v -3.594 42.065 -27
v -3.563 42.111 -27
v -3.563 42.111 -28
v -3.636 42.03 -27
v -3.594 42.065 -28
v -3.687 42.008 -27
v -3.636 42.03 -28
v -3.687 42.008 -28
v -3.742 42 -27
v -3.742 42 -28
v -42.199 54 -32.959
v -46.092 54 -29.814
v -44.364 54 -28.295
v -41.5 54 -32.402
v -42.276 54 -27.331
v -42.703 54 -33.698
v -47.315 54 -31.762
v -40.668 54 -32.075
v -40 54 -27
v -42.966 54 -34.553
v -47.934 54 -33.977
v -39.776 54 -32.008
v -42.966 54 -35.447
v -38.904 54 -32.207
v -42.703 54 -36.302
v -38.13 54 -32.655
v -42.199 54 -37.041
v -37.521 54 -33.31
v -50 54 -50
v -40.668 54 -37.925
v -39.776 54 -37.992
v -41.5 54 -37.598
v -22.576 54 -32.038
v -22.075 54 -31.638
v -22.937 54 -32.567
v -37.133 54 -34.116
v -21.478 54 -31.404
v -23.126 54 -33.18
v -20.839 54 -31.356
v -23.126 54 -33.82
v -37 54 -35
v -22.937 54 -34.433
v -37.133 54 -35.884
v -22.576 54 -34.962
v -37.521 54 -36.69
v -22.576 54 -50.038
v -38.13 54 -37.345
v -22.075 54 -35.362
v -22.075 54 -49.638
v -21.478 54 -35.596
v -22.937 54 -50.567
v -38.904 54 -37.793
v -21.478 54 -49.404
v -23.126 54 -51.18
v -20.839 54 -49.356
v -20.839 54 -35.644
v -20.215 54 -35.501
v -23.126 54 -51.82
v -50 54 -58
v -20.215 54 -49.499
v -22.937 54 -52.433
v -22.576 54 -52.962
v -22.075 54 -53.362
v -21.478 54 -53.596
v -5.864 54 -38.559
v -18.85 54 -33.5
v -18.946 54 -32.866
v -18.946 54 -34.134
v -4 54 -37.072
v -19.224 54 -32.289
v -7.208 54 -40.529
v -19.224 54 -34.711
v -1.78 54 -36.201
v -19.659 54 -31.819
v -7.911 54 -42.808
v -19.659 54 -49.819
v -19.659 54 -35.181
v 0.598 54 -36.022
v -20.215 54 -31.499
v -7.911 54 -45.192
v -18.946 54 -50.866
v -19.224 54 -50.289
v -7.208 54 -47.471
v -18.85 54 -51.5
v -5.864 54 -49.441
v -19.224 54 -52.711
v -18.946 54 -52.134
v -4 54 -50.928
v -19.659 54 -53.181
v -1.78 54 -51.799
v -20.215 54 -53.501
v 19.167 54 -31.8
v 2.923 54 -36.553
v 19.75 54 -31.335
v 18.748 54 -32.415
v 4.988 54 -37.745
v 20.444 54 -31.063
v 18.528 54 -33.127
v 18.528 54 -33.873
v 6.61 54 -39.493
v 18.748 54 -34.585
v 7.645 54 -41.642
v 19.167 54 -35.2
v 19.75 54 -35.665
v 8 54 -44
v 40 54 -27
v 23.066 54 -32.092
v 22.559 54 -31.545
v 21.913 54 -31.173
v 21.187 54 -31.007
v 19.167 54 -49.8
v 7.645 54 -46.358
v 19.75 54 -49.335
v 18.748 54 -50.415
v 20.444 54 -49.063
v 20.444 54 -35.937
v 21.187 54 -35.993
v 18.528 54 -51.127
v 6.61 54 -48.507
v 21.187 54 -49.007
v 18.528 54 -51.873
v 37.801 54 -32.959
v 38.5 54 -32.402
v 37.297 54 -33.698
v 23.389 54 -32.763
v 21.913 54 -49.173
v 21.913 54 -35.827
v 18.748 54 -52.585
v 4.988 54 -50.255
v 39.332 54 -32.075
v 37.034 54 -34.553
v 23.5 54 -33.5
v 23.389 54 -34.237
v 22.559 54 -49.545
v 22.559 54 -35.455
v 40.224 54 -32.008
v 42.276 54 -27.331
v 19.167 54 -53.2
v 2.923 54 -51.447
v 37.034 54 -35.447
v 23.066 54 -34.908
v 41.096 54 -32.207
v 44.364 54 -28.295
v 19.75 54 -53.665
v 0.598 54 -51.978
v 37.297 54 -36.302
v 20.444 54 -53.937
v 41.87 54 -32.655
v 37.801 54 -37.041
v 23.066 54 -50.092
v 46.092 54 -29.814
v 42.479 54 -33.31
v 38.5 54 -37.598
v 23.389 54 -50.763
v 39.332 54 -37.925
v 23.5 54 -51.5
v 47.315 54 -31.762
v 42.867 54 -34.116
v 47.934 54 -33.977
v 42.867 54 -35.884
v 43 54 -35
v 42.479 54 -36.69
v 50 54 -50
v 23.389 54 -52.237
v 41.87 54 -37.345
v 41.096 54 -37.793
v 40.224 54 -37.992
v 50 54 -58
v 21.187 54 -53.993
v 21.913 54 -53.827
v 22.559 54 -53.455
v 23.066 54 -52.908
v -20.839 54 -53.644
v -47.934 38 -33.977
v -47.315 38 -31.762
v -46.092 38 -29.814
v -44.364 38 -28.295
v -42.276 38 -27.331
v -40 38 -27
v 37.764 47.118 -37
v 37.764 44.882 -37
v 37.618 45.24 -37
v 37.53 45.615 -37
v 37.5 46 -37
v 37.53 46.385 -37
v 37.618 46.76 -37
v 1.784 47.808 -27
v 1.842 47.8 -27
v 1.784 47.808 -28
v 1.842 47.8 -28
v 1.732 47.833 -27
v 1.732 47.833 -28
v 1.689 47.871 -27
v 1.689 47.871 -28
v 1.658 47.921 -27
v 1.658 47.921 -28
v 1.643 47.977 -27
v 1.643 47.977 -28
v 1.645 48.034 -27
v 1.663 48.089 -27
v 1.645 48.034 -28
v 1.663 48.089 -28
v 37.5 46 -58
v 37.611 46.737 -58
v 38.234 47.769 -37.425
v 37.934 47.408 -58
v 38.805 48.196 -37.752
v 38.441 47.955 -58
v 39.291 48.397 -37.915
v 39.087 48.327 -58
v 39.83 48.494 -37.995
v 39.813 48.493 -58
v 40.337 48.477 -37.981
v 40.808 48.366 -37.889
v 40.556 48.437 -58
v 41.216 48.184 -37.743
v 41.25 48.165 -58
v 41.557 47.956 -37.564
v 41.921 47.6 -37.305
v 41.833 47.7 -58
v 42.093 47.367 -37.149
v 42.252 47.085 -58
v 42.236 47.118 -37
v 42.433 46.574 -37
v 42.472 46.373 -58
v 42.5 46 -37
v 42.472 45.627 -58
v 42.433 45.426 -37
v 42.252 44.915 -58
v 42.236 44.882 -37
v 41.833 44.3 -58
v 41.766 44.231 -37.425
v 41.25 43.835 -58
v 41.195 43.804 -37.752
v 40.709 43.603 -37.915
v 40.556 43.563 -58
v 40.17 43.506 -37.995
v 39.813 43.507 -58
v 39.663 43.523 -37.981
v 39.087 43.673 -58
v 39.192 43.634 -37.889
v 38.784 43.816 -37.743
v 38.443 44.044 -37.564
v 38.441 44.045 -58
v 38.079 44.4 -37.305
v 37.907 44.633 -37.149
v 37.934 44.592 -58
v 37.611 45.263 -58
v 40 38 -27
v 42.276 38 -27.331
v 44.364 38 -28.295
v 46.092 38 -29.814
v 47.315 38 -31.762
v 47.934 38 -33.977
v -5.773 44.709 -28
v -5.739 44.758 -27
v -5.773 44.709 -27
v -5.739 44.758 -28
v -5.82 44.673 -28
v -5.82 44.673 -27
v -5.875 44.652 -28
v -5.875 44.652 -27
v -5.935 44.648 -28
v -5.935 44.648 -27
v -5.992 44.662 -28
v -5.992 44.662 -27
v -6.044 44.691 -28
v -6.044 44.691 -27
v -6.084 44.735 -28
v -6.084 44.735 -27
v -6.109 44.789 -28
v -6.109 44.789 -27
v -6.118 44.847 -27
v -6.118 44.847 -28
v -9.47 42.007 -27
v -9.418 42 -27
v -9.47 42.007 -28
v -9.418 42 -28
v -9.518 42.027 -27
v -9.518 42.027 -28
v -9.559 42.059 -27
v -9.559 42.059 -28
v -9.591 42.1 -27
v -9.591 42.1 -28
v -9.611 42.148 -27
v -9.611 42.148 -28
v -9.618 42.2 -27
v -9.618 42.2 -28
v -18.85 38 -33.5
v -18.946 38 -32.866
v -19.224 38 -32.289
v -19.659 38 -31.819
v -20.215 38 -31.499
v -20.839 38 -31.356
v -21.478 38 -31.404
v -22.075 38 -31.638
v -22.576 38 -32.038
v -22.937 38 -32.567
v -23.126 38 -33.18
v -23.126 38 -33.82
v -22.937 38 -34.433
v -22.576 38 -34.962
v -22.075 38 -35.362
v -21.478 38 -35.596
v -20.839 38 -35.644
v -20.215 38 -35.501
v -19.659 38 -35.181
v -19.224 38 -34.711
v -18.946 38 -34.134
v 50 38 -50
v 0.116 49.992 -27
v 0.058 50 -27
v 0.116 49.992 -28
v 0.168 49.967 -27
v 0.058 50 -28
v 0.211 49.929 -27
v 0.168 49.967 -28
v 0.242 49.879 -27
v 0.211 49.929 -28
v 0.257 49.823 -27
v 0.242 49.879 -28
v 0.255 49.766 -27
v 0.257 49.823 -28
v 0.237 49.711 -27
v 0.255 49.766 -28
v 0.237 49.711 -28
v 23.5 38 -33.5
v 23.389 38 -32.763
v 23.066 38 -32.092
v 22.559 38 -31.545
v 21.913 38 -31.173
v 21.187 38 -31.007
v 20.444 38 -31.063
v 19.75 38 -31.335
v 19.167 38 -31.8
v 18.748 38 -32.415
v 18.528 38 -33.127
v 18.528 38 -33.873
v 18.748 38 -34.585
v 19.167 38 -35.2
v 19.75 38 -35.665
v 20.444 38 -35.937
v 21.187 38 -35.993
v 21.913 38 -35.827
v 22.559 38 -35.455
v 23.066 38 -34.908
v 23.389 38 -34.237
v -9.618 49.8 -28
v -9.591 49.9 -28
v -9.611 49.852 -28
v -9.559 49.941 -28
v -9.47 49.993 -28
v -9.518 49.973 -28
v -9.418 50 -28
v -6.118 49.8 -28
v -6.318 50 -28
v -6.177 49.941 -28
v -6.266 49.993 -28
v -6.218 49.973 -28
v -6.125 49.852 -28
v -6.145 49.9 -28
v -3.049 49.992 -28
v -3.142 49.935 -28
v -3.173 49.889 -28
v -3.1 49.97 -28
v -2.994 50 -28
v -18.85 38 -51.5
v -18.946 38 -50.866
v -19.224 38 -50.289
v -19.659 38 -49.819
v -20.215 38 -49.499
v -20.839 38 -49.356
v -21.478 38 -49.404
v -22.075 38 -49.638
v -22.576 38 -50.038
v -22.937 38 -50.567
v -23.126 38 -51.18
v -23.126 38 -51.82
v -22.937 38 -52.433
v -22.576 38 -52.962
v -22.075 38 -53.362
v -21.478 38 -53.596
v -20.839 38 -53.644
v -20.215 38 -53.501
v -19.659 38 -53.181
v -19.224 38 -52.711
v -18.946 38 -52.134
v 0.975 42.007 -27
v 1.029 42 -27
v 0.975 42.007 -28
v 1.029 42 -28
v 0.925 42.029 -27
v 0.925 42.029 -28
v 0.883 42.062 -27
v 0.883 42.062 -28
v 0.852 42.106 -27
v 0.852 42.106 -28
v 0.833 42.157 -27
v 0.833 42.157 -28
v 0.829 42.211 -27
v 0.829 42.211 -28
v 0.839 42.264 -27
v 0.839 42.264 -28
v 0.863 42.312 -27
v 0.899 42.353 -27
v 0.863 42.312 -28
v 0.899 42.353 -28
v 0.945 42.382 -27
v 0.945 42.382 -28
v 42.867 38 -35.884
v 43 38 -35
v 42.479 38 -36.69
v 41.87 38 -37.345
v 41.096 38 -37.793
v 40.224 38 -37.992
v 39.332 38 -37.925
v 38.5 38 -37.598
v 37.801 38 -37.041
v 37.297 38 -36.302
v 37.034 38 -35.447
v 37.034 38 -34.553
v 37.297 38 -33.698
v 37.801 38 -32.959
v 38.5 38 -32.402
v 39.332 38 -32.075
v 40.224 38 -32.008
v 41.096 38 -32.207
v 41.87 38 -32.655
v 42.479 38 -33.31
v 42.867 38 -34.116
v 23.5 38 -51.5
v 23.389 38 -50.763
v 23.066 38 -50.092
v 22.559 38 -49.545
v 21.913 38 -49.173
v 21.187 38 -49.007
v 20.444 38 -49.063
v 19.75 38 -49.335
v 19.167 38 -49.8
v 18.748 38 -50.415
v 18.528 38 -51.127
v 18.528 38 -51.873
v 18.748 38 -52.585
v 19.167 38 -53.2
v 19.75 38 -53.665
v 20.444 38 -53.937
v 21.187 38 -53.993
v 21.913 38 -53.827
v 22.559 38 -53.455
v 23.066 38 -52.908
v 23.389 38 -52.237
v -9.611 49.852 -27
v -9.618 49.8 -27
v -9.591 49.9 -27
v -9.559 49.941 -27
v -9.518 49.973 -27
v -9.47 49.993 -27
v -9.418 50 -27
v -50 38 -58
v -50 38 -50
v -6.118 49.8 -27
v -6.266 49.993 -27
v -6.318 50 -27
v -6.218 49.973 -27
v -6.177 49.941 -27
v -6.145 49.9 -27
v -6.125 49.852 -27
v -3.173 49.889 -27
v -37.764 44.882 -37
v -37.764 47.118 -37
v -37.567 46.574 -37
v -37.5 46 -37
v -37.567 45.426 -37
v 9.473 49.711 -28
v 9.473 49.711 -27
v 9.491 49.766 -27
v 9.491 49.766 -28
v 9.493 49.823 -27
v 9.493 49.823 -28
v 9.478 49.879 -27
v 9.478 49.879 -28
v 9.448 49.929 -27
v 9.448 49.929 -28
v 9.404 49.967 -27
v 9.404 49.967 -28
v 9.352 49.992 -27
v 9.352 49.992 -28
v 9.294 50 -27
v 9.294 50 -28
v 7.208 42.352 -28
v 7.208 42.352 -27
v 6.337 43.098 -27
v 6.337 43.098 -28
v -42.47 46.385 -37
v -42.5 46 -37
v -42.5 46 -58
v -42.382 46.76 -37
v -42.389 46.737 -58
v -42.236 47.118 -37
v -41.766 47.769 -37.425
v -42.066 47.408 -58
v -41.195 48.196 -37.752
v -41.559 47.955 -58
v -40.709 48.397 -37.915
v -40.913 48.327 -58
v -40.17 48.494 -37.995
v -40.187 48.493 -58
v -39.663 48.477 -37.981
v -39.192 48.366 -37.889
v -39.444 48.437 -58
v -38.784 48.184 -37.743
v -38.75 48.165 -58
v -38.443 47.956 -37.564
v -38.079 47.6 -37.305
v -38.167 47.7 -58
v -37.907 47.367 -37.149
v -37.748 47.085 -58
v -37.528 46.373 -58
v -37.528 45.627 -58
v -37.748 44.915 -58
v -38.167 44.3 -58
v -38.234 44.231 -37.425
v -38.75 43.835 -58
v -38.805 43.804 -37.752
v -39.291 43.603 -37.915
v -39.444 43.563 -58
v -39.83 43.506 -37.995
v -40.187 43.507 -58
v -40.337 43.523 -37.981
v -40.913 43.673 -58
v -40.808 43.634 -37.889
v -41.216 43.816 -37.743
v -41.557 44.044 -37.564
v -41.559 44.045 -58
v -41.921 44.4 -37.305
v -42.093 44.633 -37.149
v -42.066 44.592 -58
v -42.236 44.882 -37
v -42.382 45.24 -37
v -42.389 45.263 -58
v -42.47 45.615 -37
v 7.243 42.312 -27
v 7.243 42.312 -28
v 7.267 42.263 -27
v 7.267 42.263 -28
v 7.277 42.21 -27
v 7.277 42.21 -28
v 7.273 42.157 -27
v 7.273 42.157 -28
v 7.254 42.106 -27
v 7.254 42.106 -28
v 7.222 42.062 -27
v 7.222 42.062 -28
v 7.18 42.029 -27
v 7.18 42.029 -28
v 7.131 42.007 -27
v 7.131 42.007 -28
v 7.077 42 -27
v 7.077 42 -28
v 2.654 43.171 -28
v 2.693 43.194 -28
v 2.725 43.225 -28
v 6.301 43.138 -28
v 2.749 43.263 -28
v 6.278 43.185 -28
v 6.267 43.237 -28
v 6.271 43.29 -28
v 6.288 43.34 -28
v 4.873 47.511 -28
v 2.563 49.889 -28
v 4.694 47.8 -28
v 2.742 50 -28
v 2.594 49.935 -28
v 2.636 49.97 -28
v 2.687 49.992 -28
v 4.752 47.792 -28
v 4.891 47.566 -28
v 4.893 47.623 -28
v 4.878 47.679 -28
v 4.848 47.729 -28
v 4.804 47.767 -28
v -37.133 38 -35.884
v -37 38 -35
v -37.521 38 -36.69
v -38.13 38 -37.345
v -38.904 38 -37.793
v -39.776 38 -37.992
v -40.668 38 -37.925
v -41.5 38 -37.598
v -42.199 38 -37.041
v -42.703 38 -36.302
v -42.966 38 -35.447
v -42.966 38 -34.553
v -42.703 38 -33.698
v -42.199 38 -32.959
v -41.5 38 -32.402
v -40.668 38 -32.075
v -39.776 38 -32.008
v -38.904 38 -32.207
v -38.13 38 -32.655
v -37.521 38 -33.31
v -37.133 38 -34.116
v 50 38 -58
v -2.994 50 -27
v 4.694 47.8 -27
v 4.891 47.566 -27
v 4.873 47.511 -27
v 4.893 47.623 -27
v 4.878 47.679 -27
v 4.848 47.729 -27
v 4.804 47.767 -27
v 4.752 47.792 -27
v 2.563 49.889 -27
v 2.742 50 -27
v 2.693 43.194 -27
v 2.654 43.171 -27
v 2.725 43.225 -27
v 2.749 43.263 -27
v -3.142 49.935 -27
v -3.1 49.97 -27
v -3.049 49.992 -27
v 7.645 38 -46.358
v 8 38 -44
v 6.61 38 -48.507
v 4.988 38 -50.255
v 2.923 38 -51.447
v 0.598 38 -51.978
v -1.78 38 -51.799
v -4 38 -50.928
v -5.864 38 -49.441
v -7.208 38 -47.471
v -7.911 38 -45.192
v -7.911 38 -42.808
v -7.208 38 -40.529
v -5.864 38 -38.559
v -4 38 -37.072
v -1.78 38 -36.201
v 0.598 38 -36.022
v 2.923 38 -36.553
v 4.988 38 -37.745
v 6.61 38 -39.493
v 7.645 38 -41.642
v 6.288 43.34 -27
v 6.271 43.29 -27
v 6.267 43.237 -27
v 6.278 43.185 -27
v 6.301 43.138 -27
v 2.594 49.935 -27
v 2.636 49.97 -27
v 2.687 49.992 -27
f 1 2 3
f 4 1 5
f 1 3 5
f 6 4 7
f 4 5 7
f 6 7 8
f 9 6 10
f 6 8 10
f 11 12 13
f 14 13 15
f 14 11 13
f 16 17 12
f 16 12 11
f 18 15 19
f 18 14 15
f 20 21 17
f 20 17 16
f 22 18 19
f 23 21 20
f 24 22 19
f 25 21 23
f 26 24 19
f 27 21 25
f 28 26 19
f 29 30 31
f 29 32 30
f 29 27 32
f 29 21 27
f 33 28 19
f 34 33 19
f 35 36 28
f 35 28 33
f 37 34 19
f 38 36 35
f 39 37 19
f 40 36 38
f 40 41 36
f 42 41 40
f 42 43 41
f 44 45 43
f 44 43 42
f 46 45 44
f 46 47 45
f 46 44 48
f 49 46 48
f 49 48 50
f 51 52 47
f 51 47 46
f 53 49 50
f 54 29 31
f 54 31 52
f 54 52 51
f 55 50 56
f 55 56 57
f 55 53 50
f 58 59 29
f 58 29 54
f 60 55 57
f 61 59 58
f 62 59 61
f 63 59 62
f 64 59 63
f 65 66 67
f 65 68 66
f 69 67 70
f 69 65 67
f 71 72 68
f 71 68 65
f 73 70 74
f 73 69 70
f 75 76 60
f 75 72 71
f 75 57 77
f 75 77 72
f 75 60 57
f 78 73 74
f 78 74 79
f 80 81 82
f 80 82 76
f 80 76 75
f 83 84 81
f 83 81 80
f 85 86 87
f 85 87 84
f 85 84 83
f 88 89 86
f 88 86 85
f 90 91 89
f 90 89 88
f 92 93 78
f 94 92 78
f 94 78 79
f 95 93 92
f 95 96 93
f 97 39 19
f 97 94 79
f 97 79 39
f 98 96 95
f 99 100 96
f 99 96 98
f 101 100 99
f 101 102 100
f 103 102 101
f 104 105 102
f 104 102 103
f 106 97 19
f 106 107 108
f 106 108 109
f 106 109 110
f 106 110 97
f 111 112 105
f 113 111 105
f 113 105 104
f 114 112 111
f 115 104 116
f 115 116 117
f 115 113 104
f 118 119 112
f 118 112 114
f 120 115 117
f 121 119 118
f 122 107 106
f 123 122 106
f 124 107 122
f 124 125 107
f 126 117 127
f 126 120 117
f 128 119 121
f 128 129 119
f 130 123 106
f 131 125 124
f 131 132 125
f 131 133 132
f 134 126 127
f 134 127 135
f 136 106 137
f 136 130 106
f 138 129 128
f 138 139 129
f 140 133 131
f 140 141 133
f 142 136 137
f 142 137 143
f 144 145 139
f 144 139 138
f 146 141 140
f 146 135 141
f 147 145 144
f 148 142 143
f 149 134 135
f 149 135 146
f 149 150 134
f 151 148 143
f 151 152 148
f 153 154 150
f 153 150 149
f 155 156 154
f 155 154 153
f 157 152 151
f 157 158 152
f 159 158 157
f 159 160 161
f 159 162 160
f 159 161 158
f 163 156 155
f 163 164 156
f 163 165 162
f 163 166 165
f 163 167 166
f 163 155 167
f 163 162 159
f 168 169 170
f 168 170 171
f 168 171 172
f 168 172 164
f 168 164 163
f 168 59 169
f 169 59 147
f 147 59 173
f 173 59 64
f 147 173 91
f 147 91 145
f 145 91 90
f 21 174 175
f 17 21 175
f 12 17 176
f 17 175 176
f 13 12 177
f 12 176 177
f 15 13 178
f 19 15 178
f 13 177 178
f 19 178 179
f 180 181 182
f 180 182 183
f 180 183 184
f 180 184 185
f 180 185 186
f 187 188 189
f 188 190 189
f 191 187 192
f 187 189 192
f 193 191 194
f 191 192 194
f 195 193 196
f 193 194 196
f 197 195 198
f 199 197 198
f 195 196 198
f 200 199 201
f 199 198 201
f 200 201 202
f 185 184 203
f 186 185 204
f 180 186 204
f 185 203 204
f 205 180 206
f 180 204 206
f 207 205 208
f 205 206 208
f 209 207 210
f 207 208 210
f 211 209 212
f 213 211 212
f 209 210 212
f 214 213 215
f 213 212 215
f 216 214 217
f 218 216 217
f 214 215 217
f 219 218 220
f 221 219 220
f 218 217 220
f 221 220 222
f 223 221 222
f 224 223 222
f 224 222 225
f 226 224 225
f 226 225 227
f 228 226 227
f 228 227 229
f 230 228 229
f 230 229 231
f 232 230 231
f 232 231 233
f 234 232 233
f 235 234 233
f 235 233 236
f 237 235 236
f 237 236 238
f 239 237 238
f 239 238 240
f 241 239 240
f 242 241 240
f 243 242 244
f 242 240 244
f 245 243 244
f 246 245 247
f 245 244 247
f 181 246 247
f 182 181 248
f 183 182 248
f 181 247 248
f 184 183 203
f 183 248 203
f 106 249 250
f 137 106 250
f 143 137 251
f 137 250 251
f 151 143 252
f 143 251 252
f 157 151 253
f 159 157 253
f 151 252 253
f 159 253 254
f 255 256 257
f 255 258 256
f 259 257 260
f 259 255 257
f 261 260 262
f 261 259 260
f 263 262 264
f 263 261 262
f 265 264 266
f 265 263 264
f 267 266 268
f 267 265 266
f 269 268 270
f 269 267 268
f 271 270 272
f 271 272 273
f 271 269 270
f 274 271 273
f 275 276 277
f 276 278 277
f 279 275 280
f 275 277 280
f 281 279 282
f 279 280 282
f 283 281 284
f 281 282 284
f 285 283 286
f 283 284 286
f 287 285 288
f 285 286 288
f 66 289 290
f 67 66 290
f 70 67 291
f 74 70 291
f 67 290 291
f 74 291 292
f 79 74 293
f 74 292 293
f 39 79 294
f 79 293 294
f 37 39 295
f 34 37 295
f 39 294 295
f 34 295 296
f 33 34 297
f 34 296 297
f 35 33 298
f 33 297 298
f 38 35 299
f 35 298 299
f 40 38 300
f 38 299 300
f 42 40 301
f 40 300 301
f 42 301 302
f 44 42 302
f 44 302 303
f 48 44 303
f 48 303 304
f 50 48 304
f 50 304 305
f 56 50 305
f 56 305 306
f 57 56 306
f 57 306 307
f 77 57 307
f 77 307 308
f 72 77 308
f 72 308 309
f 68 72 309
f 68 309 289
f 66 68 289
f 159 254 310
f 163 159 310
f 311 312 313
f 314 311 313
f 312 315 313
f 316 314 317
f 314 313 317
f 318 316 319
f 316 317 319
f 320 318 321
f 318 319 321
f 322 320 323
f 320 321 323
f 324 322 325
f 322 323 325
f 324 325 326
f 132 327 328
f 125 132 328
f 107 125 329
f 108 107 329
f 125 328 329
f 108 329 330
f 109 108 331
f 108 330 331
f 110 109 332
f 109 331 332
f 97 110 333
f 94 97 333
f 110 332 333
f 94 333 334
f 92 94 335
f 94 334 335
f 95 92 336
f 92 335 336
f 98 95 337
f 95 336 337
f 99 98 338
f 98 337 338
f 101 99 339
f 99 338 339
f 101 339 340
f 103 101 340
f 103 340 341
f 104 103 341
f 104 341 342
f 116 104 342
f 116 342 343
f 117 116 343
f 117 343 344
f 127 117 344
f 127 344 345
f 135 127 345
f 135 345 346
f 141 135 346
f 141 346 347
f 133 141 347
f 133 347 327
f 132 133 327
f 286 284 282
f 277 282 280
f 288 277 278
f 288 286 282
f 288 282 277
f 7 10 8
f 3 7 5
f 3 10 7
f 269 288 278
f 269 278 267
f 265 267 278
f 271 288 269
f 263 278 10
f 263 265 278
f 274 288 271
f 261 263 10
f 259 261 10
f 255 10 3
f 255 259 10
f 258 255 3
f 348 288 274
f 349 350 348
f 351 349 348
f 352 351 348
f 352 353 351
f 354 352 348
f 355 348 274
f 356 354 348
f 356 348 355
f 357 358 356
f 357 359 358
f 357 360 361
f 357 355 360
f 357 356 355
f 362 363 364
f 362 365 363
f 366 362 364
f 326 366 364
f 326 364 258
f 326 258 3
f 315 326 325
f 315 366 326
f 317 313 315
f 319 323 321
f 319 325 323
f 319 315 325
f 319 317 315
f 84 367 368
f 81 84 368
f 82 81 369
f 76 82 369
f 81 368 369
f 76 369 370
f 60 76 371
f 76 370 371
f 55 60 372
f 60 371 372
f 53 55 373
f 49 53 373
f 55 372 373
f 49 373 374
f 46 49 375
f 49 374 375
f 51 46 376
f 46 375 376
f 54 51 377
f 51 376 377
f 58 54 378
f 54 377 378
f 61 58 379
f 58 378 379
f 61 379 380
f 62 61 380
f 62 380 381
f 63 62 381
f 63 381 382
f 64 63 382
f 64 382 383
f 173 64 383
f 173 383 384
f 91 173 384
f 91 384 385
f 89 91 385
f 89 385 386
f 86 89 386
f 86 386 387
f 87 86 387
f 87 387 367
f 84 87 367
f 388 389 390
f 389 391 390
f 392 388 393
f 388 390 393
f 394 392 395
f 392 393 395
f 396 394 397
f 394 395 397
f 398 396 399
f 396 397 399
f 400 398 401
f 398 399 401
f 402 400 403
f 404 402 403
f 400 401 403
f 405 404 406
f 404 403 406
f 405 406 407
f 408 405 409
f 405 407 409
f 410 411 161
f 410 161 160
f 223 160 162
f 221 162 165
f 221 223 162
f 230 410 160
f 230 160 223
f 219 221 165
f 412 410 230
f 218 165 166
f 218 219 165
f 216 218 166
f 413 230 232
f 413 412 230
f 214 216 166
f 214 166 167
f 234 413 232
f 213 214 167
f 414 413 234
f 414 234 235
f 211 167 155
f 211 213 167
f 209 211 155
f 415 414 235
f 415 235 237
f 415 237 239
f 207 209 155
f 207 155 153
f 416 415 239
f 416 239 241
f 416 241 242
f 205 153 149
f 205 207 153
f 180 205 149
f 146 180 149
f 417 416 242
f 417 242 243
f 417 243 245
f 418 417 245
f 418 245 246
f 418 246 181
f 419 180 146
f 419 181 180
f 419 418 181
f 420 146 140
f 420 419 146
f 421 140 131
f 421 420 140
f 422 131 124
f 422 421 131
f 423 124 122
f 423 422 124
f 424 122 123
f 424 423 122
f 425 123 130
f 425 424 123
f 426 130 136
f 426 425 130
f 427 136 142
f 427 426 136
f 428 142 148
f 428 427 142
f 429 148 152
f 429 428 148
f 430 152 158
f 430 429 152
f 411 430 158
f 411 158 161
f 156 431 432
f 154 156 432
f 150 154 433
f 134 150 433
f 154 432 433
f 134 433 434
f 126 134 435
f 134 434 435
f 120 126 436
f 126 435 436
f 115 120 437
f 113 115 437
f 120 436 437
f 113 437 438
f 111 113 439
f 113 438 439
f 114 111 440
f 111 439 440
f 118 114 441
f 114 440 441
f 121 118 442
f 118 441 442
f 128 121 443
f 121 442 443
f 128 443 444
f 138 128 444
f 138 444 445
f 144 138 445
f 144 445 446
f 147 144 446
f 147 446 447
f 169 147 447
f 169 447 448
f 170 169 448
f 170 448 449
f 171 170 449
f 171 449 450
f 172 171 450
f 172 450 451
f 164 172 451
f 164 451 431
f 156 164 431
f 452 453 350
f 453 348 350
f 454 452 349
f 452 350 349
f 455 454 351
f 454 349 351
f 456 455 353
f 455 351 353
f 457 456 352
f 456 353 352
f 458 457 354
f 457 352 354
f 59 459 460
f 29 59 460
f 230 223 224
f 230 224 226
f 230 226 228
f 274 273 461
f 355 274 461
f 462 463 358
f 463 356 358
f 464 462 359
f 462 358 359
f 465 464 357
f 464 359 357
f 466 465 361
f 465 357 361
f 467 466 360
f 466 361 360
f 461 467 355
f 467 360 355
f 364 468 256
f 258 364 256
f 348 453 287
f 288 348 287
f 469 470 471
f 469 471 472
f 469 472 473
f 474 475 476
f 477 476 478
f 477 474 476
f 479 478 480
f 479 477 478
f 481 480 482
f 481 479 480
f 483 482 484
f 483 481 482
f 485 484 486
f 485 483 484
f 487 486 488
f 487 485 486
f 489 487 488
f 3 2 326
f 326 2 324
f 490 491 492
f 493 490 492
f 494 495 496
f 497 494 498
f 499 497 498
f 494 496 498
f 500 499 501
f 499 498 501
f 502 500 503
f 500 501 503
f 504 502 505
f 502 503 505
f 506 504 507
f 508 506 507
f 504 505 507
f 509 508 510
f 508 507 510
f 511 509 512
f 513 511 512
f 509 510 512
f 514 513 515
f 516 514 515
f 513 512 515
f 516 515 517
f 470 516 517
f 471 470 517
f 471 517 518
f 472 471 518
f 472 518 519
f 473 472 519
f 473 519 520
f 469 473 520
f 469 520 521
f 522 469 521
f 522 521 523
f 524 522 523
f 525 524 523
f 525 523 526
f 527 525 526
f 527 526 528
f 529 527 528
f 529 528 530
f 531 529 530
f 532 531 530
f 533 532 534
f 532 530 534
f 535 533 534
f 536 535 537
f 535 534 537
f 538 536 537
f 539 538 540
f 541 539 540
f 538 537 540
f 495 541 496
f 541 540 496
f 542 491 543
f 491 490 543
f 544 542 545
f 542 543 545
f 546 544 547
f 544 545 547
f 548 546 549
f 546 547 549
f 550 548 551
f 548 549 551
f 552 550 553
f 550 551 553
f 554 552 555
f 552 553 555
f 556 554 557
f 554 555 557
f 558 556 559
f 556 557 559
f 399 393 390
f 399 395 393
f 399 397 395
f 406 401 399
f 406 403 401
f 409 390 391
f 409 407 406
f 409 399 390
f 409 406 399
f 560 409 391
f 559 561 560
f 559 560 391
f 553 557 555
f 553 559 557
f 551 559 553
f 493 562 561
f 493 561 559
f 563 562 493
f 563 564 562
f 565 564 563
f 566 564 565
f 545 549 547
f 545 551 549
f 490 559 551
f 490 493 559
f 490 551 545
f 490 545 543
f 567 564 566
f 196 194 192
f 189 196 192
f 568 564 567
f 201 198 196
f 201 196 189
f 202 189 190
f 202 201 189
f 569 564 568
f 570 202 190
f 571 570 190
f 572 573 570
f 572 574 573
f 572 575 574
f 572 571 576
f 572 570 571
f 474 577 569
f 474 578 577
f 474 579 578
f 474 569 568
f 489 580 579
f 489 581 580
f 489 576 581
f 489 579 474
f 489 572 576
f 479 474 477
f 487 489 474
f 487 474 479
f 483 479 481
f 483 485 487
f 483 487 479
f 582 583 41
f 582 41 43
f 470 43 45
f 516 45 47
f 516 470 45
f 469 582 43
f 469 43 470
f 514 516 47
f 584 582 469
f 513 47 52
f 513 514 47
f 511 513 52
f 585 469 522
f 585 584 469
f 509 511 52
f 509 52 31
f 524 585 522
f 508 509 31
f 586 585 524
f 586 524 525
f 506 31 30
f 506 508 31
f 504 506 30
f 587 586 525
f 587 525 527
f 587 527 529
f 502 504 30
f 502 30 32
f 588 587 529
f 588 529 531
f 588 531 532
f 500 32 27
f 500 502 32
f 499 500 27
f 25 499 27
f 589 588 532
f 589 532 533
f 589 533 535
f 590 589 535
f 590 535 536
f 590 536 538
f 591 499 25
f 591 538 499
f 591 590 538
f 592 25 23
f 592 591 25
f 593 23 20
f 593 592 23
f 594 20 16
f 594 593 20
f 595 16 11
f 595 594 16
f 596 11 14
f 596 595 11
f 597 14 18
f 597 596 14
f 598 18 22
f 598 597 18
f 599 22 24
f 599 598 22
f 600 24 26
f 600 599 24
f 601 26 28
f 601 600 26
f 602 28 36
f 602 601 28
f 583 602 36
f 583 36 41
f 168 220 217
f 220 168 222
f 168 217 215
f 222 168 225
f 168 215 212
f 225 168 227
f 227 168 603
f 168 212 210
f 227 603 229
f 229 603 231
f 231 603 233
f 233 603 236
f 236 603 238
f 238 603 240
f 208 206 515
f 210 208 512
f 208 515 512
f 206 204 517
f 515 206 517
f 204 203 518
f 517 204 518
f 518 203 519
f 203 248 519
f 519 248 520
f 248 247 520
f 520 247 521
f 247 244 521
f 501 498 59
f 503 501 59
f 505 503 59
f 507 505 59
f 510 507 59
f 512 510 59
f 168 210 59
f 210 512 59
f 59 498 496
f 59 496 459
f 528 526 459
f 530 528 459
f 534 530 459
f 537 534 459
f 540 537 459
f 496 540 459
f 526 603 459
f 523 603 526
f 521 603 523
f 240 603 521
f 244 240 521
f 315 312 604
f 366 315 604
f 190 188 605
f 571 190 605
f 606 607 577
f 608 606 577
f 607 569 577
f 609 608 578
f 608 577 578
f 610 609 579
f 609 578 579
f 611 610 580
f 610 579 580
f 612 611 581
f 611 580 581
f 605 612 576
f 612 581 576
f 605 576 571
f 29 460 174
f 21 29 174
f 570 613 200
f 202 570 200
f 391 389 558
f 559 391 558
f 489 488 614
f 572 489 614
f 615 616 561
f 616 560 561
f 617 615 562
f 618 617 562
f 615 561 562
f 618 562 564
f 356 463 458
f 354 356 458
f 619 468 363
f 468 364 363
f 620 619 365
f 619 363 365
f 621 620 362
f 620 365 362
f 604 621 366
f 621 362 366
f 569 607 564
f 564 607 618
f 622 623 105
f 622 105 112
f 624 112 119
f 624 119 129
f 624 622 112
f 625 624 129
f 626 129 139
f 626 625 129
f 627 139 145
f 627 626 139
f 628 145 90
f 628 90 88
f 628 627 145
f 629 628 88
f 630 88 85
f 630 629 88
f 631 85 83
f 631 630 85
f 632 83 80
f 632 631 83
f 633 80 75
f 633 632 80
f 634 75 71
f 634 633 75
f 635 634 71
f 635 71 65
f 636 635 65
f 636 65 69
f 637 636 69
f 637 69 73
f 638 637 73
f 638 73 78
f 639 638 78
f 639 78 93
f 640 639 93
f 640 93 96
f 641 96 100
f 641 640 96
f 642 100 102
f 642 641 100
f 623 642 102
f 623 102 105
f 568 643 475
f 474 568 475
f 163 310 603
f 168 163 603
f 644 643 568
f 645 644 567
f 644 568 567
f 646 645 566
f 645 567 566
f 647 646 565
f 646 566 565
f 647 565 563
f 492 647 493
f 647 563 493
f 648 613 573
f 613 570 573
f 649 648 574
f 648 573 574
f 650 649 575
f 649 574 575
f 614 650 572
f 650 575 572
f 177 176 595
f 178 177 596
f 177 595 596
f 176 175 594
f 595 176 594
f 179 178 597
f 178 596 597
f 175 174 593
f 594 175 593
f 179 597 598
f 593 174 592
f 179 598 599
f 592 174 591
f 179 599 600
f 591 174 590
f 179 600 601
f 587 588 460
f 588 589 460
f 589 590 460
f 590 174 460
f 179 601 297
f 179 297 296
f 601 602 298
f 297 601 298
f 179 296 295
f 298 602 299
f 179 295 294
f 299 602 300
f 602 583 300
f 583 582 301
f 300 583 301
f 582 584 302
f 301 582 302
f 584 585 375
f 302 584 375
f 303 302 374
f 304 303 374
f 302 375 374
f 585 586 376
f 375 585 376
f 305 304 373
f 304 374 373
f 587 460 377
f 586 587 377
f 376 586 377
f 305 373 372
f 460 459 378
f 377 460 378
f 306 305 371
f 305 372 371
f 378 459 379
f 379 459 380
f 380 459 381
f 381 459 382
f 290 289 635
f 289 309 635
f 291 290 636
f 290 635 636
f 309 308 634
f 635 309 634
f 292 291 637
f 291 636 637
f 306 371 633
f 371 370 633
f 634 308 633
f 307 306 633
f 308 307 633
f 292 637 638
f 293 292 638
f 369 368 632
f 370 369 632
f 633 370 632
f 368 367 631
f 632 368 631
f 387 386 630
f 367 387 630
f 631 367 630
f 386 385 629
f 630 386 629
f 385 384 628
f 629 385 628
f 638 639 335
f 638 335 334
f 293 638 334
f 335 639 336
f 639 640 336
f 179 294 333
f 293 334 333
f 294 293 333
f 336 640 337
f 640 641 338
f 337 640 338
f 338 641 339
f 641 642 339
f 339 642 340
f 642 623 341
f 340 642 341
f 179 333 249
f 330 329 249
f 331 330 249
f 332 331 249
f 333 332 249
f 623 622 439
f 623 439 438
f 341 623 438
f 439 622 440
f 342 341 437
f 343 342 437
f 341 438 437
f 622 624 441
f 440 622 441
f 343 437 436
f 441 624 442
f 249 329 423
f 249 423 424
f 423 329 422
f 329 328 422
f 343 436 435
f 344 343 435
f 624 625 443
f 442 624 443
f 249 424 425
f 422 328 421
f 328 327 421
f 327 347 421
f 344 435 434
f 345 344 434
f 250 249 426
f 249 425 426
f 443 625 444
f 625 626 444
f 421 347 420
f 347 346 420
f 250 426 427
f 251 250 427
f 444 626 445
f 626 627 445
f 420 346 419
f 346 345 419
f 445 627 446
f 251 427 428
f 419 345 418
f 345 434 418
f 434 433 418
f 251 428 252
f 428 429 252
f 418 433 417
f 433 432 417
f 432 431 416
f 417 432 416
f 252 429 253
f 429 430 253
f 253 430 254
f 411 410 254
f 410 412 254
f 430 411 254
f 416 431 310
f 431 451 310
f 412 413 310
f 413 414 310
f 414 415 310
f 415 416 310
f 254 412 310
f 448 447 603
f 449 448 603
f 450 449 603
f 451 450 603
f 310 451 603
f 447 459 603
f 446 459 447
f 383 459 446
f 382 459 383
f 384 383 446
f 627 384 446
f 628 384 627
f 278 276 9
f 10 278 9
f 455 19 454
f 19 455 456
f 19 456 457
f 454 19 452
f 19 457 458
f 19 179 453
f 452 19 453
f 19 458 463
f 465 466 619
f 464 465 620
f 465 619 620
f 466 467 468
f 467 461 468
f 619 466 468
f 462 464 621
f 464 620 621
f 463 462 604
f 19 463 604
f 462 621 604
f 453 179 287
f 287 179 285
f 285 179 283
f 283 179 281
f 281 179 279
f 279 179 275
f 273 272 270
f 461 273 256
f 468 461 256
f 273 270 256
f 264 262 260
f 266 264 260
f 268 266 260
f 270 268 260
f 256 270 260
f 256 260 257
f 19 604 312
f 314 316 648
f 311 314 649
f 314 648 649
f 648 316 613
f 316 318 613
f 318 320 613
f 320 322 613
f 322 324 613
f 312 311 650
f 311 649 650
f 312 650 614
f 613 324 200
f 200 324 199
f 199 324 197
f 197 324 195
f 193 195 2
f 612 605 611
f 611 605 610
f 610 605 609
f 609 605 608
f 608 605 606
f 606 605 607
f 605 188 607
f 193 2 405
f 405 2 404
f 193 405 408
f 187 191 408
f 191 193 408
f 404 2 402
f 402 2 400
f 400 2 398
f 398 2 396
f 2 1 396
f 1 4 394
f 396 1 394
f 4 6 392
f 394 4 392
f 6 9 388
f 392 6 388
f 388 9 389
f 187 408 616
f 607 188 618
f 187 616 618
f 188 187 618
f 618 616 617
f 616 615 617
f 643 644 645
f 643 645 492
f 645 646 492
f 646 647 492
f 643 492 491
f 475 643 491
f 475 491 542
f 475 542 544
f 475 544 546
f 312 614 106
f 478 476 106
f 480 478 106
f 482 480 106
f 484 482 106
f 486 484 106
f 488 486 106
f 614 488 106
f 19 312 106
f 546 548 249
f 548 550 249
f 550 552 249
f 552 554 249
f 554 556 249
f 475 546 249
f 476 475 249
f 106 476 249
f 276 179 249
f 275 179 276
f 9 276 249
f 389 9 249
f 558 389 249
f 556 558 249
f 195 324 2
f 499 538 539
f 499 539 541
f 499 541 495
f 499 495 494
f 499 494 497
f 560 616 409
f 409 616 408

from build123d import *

# Parameters (mm, degrees)
SKETCH1_R           = 14
SKETCH1_R_2         = 5
BOSS_EXTRUDE1_DEPTH = 38
SKETCH2_R           = 8
SKETCH2_R_2         = 3
BOSS_EXTRUDE2_DEPTH = 16
SKETCH3_R           = 2.5
CUT_EXTRUDE1_DEPTH  = 21
SKETCH4_R           = 2.15
SKETCH4_R_2         = 2.5
CUT_EXTRUDE2_DEPTH  = 21
CUT_EXTRUDE3_DEPTH  = 1
FILLET2_R           = 0.2


with BuildPart() as part:
    # Sketch1 → Boss-Extrude1 (new body)
    with BuildSketch(Plane(origin=(0, 0, 0), x_dir=(1, 0, 0), z_dir=(0, 1, 0))):
        with BuildLine():
            Line((40, 57), (-40, 57))
            ThreePointArc((-40, 57), (-58.987886037, 46.111263827), (-59.17994648, 24.223653075))
            Line((-59.17994648, 24.223653075), (-47.255332989, 3))
            Line((-47.255332989, 3), (-32.311027529, 3))
            ThreePointArc((-32.311027529, 3), (32.415238263, -1.501608583), (-32.45, 0))
            Line((-32.45, 0), (-47.255332989, 0))
            Line((-47.255332989, 0), (-47.255332989, -10))
            Line((-47.255332989, -10), (-41.255332989, -10))
            ThreePointArc((-41.255332989, -10), (-4.643586709, -42.195255687), (38.093342034, -18.732319468))
            Line((38.093342034, -18.732319468), (59.742132503, 25.291848568))
            ThreePointArc((59.742132503, 25.291848568), (58.675911377, 46.627997861), (40, 57))
        make_face()
        with Locations((-40, 35)):
            Circle(SKETCH1_R, mode=Mode.SUBTRACT)
        with Locations((0, 44)):
            Circle(SKETCH1_R_2, mode=Mode.SUBTRACT)
        with Locations((40, 35)):
            Circle(SKETCH1_R, mode=Mode.SUBTRACT)
    extrude(amount=BOSS_EXTRUDE1_DEPTH)


with BuildPart() as body_2:
    # Sketch2 → Boss-Extrude2 (new body)
    with BuildSketch(Plane(origin=(0, 38, 0), x_dir=(1, 0, 0), z_dir=(0, 1, 0))):
        with BuildLine():
            Line((-40, 27), (40, 27))
            ThreePointArc((40, 27), (45.282843577, 28.992374534), (47.934336402, 33.977109066))
            Line((47.934336402, 33.977109066), (50, 50))
            Line((50, 50), (50, 58))
            Line((50, 58), (-50, 58))
            Line((-50, 58), (-50, 50))
            Line((-50, 50), (-47.934336402, 33.977109066))
            ThreePointArc((-47.934336402, 33.977109066), (-45.282843577, 28.992374534), (-40, 27))
        make_face()
        with Locations((0, 44)):
            Circle(SKETCH2_R, mode=Mode.SUBTRACT)
        with Locations((-40, 35)):
            Circle(SKETCH2_R_2, mode=Mode.SUBTRACT)
        with Locations((40, 35)):
            Circle(SKETCH2_R_2, mode=Mode.SUBTRACT)
    extrude(amount=BOSS_EXTRUDE2_DEPTH)

    # Sketch3 → Cut-Extrude1 (cut)
    with BuildSketch(Plane(origin=(0, 0, -58), x_dir=(-1, 0, 0), z_dir=(0, 0, -1))):
        with Locations((-40, 46)):
            Circle(SKETCH3_R)
        with Locations((40, 46)):
            Circle(SKETCH3_R)
    extrude(amount=-CUT_EXTRUDE1_DEPTH, mode=Mode.SUBTRACT)

    # Sketch4 → Cut-Extrude2 (cut)
    with BuildSketch(Plane.XZ.offset(-38)):
        with Locations((-21, -33.5)):
            Circle(SKETCH4_R)
        with Locations((-21, -51.5)):
            Circle(SKETCH4_R)
        with Locations((21, -51.5)):
            Circle(SKETCH4_R_2)
        with Locations((21, -33.5)):
            Circle(SKETCH4_R_2)
    extrude(amount=-CUT_EXTRUDE2_DEPTH, mode=Mode.SUBTRACT)

    # Sketch6 → Cut-Extrude3 (cut)
    with BuildSketch(Plane.XY.offset(-27)):
        Polygon((-6.118033989, 44), (-6.118033989, 50), (-9.618033989, 50), (-9.618033989, 42), (-3.618033989, 42), (0.381966011, 50), (-3.118033989, 50), align=None)
        Polygon((9.618033989, 50), (2.618033989, 50), (1.518033989, 47.8), (5.018033989, 47.8), (2.718033989, 43.2), (0.118033989, 42), (2.118033989, 42), (5.618033989, 42), (7.618033989, 42), (6.218033989, 43.2), align=None)
    extrude(amount=-CUT_EXTRUDE3_DEPTH, mode=Mode.SUBTRACT)

    # Fillet2
    fillet2_edges = [body_2.edges().sort_by_distance(p)[0] for p in [
        (7.618033989, 42, -27.5),
        (0.118033989, 42, -27.5),
        (2.718033989, 43.2, -27.5),
        (5.018033989, 47.8, -27.5),
        (1.518033989, 47.8, -27.5),
        (2.618033989, 50, -27.5),
        (9.618033989, 50, -27.5),
        (6.218033989, 43.2, -27.5),
        (-6.118033989, 50, -27.5),
        (-6.118033989, 44, -27.5),
        (-3.118033989, 50, -27.5),
        (0.381966011, 50, -27.5),
        (-3.618033989, 42, -27.5),
        (-9.618033989, 42, -27.5),
        (-9.618033989, 50, -27.5),
    ]]
    fillet(fillet2_edges, radius=FILLET2_R)


solid = body_2.part
